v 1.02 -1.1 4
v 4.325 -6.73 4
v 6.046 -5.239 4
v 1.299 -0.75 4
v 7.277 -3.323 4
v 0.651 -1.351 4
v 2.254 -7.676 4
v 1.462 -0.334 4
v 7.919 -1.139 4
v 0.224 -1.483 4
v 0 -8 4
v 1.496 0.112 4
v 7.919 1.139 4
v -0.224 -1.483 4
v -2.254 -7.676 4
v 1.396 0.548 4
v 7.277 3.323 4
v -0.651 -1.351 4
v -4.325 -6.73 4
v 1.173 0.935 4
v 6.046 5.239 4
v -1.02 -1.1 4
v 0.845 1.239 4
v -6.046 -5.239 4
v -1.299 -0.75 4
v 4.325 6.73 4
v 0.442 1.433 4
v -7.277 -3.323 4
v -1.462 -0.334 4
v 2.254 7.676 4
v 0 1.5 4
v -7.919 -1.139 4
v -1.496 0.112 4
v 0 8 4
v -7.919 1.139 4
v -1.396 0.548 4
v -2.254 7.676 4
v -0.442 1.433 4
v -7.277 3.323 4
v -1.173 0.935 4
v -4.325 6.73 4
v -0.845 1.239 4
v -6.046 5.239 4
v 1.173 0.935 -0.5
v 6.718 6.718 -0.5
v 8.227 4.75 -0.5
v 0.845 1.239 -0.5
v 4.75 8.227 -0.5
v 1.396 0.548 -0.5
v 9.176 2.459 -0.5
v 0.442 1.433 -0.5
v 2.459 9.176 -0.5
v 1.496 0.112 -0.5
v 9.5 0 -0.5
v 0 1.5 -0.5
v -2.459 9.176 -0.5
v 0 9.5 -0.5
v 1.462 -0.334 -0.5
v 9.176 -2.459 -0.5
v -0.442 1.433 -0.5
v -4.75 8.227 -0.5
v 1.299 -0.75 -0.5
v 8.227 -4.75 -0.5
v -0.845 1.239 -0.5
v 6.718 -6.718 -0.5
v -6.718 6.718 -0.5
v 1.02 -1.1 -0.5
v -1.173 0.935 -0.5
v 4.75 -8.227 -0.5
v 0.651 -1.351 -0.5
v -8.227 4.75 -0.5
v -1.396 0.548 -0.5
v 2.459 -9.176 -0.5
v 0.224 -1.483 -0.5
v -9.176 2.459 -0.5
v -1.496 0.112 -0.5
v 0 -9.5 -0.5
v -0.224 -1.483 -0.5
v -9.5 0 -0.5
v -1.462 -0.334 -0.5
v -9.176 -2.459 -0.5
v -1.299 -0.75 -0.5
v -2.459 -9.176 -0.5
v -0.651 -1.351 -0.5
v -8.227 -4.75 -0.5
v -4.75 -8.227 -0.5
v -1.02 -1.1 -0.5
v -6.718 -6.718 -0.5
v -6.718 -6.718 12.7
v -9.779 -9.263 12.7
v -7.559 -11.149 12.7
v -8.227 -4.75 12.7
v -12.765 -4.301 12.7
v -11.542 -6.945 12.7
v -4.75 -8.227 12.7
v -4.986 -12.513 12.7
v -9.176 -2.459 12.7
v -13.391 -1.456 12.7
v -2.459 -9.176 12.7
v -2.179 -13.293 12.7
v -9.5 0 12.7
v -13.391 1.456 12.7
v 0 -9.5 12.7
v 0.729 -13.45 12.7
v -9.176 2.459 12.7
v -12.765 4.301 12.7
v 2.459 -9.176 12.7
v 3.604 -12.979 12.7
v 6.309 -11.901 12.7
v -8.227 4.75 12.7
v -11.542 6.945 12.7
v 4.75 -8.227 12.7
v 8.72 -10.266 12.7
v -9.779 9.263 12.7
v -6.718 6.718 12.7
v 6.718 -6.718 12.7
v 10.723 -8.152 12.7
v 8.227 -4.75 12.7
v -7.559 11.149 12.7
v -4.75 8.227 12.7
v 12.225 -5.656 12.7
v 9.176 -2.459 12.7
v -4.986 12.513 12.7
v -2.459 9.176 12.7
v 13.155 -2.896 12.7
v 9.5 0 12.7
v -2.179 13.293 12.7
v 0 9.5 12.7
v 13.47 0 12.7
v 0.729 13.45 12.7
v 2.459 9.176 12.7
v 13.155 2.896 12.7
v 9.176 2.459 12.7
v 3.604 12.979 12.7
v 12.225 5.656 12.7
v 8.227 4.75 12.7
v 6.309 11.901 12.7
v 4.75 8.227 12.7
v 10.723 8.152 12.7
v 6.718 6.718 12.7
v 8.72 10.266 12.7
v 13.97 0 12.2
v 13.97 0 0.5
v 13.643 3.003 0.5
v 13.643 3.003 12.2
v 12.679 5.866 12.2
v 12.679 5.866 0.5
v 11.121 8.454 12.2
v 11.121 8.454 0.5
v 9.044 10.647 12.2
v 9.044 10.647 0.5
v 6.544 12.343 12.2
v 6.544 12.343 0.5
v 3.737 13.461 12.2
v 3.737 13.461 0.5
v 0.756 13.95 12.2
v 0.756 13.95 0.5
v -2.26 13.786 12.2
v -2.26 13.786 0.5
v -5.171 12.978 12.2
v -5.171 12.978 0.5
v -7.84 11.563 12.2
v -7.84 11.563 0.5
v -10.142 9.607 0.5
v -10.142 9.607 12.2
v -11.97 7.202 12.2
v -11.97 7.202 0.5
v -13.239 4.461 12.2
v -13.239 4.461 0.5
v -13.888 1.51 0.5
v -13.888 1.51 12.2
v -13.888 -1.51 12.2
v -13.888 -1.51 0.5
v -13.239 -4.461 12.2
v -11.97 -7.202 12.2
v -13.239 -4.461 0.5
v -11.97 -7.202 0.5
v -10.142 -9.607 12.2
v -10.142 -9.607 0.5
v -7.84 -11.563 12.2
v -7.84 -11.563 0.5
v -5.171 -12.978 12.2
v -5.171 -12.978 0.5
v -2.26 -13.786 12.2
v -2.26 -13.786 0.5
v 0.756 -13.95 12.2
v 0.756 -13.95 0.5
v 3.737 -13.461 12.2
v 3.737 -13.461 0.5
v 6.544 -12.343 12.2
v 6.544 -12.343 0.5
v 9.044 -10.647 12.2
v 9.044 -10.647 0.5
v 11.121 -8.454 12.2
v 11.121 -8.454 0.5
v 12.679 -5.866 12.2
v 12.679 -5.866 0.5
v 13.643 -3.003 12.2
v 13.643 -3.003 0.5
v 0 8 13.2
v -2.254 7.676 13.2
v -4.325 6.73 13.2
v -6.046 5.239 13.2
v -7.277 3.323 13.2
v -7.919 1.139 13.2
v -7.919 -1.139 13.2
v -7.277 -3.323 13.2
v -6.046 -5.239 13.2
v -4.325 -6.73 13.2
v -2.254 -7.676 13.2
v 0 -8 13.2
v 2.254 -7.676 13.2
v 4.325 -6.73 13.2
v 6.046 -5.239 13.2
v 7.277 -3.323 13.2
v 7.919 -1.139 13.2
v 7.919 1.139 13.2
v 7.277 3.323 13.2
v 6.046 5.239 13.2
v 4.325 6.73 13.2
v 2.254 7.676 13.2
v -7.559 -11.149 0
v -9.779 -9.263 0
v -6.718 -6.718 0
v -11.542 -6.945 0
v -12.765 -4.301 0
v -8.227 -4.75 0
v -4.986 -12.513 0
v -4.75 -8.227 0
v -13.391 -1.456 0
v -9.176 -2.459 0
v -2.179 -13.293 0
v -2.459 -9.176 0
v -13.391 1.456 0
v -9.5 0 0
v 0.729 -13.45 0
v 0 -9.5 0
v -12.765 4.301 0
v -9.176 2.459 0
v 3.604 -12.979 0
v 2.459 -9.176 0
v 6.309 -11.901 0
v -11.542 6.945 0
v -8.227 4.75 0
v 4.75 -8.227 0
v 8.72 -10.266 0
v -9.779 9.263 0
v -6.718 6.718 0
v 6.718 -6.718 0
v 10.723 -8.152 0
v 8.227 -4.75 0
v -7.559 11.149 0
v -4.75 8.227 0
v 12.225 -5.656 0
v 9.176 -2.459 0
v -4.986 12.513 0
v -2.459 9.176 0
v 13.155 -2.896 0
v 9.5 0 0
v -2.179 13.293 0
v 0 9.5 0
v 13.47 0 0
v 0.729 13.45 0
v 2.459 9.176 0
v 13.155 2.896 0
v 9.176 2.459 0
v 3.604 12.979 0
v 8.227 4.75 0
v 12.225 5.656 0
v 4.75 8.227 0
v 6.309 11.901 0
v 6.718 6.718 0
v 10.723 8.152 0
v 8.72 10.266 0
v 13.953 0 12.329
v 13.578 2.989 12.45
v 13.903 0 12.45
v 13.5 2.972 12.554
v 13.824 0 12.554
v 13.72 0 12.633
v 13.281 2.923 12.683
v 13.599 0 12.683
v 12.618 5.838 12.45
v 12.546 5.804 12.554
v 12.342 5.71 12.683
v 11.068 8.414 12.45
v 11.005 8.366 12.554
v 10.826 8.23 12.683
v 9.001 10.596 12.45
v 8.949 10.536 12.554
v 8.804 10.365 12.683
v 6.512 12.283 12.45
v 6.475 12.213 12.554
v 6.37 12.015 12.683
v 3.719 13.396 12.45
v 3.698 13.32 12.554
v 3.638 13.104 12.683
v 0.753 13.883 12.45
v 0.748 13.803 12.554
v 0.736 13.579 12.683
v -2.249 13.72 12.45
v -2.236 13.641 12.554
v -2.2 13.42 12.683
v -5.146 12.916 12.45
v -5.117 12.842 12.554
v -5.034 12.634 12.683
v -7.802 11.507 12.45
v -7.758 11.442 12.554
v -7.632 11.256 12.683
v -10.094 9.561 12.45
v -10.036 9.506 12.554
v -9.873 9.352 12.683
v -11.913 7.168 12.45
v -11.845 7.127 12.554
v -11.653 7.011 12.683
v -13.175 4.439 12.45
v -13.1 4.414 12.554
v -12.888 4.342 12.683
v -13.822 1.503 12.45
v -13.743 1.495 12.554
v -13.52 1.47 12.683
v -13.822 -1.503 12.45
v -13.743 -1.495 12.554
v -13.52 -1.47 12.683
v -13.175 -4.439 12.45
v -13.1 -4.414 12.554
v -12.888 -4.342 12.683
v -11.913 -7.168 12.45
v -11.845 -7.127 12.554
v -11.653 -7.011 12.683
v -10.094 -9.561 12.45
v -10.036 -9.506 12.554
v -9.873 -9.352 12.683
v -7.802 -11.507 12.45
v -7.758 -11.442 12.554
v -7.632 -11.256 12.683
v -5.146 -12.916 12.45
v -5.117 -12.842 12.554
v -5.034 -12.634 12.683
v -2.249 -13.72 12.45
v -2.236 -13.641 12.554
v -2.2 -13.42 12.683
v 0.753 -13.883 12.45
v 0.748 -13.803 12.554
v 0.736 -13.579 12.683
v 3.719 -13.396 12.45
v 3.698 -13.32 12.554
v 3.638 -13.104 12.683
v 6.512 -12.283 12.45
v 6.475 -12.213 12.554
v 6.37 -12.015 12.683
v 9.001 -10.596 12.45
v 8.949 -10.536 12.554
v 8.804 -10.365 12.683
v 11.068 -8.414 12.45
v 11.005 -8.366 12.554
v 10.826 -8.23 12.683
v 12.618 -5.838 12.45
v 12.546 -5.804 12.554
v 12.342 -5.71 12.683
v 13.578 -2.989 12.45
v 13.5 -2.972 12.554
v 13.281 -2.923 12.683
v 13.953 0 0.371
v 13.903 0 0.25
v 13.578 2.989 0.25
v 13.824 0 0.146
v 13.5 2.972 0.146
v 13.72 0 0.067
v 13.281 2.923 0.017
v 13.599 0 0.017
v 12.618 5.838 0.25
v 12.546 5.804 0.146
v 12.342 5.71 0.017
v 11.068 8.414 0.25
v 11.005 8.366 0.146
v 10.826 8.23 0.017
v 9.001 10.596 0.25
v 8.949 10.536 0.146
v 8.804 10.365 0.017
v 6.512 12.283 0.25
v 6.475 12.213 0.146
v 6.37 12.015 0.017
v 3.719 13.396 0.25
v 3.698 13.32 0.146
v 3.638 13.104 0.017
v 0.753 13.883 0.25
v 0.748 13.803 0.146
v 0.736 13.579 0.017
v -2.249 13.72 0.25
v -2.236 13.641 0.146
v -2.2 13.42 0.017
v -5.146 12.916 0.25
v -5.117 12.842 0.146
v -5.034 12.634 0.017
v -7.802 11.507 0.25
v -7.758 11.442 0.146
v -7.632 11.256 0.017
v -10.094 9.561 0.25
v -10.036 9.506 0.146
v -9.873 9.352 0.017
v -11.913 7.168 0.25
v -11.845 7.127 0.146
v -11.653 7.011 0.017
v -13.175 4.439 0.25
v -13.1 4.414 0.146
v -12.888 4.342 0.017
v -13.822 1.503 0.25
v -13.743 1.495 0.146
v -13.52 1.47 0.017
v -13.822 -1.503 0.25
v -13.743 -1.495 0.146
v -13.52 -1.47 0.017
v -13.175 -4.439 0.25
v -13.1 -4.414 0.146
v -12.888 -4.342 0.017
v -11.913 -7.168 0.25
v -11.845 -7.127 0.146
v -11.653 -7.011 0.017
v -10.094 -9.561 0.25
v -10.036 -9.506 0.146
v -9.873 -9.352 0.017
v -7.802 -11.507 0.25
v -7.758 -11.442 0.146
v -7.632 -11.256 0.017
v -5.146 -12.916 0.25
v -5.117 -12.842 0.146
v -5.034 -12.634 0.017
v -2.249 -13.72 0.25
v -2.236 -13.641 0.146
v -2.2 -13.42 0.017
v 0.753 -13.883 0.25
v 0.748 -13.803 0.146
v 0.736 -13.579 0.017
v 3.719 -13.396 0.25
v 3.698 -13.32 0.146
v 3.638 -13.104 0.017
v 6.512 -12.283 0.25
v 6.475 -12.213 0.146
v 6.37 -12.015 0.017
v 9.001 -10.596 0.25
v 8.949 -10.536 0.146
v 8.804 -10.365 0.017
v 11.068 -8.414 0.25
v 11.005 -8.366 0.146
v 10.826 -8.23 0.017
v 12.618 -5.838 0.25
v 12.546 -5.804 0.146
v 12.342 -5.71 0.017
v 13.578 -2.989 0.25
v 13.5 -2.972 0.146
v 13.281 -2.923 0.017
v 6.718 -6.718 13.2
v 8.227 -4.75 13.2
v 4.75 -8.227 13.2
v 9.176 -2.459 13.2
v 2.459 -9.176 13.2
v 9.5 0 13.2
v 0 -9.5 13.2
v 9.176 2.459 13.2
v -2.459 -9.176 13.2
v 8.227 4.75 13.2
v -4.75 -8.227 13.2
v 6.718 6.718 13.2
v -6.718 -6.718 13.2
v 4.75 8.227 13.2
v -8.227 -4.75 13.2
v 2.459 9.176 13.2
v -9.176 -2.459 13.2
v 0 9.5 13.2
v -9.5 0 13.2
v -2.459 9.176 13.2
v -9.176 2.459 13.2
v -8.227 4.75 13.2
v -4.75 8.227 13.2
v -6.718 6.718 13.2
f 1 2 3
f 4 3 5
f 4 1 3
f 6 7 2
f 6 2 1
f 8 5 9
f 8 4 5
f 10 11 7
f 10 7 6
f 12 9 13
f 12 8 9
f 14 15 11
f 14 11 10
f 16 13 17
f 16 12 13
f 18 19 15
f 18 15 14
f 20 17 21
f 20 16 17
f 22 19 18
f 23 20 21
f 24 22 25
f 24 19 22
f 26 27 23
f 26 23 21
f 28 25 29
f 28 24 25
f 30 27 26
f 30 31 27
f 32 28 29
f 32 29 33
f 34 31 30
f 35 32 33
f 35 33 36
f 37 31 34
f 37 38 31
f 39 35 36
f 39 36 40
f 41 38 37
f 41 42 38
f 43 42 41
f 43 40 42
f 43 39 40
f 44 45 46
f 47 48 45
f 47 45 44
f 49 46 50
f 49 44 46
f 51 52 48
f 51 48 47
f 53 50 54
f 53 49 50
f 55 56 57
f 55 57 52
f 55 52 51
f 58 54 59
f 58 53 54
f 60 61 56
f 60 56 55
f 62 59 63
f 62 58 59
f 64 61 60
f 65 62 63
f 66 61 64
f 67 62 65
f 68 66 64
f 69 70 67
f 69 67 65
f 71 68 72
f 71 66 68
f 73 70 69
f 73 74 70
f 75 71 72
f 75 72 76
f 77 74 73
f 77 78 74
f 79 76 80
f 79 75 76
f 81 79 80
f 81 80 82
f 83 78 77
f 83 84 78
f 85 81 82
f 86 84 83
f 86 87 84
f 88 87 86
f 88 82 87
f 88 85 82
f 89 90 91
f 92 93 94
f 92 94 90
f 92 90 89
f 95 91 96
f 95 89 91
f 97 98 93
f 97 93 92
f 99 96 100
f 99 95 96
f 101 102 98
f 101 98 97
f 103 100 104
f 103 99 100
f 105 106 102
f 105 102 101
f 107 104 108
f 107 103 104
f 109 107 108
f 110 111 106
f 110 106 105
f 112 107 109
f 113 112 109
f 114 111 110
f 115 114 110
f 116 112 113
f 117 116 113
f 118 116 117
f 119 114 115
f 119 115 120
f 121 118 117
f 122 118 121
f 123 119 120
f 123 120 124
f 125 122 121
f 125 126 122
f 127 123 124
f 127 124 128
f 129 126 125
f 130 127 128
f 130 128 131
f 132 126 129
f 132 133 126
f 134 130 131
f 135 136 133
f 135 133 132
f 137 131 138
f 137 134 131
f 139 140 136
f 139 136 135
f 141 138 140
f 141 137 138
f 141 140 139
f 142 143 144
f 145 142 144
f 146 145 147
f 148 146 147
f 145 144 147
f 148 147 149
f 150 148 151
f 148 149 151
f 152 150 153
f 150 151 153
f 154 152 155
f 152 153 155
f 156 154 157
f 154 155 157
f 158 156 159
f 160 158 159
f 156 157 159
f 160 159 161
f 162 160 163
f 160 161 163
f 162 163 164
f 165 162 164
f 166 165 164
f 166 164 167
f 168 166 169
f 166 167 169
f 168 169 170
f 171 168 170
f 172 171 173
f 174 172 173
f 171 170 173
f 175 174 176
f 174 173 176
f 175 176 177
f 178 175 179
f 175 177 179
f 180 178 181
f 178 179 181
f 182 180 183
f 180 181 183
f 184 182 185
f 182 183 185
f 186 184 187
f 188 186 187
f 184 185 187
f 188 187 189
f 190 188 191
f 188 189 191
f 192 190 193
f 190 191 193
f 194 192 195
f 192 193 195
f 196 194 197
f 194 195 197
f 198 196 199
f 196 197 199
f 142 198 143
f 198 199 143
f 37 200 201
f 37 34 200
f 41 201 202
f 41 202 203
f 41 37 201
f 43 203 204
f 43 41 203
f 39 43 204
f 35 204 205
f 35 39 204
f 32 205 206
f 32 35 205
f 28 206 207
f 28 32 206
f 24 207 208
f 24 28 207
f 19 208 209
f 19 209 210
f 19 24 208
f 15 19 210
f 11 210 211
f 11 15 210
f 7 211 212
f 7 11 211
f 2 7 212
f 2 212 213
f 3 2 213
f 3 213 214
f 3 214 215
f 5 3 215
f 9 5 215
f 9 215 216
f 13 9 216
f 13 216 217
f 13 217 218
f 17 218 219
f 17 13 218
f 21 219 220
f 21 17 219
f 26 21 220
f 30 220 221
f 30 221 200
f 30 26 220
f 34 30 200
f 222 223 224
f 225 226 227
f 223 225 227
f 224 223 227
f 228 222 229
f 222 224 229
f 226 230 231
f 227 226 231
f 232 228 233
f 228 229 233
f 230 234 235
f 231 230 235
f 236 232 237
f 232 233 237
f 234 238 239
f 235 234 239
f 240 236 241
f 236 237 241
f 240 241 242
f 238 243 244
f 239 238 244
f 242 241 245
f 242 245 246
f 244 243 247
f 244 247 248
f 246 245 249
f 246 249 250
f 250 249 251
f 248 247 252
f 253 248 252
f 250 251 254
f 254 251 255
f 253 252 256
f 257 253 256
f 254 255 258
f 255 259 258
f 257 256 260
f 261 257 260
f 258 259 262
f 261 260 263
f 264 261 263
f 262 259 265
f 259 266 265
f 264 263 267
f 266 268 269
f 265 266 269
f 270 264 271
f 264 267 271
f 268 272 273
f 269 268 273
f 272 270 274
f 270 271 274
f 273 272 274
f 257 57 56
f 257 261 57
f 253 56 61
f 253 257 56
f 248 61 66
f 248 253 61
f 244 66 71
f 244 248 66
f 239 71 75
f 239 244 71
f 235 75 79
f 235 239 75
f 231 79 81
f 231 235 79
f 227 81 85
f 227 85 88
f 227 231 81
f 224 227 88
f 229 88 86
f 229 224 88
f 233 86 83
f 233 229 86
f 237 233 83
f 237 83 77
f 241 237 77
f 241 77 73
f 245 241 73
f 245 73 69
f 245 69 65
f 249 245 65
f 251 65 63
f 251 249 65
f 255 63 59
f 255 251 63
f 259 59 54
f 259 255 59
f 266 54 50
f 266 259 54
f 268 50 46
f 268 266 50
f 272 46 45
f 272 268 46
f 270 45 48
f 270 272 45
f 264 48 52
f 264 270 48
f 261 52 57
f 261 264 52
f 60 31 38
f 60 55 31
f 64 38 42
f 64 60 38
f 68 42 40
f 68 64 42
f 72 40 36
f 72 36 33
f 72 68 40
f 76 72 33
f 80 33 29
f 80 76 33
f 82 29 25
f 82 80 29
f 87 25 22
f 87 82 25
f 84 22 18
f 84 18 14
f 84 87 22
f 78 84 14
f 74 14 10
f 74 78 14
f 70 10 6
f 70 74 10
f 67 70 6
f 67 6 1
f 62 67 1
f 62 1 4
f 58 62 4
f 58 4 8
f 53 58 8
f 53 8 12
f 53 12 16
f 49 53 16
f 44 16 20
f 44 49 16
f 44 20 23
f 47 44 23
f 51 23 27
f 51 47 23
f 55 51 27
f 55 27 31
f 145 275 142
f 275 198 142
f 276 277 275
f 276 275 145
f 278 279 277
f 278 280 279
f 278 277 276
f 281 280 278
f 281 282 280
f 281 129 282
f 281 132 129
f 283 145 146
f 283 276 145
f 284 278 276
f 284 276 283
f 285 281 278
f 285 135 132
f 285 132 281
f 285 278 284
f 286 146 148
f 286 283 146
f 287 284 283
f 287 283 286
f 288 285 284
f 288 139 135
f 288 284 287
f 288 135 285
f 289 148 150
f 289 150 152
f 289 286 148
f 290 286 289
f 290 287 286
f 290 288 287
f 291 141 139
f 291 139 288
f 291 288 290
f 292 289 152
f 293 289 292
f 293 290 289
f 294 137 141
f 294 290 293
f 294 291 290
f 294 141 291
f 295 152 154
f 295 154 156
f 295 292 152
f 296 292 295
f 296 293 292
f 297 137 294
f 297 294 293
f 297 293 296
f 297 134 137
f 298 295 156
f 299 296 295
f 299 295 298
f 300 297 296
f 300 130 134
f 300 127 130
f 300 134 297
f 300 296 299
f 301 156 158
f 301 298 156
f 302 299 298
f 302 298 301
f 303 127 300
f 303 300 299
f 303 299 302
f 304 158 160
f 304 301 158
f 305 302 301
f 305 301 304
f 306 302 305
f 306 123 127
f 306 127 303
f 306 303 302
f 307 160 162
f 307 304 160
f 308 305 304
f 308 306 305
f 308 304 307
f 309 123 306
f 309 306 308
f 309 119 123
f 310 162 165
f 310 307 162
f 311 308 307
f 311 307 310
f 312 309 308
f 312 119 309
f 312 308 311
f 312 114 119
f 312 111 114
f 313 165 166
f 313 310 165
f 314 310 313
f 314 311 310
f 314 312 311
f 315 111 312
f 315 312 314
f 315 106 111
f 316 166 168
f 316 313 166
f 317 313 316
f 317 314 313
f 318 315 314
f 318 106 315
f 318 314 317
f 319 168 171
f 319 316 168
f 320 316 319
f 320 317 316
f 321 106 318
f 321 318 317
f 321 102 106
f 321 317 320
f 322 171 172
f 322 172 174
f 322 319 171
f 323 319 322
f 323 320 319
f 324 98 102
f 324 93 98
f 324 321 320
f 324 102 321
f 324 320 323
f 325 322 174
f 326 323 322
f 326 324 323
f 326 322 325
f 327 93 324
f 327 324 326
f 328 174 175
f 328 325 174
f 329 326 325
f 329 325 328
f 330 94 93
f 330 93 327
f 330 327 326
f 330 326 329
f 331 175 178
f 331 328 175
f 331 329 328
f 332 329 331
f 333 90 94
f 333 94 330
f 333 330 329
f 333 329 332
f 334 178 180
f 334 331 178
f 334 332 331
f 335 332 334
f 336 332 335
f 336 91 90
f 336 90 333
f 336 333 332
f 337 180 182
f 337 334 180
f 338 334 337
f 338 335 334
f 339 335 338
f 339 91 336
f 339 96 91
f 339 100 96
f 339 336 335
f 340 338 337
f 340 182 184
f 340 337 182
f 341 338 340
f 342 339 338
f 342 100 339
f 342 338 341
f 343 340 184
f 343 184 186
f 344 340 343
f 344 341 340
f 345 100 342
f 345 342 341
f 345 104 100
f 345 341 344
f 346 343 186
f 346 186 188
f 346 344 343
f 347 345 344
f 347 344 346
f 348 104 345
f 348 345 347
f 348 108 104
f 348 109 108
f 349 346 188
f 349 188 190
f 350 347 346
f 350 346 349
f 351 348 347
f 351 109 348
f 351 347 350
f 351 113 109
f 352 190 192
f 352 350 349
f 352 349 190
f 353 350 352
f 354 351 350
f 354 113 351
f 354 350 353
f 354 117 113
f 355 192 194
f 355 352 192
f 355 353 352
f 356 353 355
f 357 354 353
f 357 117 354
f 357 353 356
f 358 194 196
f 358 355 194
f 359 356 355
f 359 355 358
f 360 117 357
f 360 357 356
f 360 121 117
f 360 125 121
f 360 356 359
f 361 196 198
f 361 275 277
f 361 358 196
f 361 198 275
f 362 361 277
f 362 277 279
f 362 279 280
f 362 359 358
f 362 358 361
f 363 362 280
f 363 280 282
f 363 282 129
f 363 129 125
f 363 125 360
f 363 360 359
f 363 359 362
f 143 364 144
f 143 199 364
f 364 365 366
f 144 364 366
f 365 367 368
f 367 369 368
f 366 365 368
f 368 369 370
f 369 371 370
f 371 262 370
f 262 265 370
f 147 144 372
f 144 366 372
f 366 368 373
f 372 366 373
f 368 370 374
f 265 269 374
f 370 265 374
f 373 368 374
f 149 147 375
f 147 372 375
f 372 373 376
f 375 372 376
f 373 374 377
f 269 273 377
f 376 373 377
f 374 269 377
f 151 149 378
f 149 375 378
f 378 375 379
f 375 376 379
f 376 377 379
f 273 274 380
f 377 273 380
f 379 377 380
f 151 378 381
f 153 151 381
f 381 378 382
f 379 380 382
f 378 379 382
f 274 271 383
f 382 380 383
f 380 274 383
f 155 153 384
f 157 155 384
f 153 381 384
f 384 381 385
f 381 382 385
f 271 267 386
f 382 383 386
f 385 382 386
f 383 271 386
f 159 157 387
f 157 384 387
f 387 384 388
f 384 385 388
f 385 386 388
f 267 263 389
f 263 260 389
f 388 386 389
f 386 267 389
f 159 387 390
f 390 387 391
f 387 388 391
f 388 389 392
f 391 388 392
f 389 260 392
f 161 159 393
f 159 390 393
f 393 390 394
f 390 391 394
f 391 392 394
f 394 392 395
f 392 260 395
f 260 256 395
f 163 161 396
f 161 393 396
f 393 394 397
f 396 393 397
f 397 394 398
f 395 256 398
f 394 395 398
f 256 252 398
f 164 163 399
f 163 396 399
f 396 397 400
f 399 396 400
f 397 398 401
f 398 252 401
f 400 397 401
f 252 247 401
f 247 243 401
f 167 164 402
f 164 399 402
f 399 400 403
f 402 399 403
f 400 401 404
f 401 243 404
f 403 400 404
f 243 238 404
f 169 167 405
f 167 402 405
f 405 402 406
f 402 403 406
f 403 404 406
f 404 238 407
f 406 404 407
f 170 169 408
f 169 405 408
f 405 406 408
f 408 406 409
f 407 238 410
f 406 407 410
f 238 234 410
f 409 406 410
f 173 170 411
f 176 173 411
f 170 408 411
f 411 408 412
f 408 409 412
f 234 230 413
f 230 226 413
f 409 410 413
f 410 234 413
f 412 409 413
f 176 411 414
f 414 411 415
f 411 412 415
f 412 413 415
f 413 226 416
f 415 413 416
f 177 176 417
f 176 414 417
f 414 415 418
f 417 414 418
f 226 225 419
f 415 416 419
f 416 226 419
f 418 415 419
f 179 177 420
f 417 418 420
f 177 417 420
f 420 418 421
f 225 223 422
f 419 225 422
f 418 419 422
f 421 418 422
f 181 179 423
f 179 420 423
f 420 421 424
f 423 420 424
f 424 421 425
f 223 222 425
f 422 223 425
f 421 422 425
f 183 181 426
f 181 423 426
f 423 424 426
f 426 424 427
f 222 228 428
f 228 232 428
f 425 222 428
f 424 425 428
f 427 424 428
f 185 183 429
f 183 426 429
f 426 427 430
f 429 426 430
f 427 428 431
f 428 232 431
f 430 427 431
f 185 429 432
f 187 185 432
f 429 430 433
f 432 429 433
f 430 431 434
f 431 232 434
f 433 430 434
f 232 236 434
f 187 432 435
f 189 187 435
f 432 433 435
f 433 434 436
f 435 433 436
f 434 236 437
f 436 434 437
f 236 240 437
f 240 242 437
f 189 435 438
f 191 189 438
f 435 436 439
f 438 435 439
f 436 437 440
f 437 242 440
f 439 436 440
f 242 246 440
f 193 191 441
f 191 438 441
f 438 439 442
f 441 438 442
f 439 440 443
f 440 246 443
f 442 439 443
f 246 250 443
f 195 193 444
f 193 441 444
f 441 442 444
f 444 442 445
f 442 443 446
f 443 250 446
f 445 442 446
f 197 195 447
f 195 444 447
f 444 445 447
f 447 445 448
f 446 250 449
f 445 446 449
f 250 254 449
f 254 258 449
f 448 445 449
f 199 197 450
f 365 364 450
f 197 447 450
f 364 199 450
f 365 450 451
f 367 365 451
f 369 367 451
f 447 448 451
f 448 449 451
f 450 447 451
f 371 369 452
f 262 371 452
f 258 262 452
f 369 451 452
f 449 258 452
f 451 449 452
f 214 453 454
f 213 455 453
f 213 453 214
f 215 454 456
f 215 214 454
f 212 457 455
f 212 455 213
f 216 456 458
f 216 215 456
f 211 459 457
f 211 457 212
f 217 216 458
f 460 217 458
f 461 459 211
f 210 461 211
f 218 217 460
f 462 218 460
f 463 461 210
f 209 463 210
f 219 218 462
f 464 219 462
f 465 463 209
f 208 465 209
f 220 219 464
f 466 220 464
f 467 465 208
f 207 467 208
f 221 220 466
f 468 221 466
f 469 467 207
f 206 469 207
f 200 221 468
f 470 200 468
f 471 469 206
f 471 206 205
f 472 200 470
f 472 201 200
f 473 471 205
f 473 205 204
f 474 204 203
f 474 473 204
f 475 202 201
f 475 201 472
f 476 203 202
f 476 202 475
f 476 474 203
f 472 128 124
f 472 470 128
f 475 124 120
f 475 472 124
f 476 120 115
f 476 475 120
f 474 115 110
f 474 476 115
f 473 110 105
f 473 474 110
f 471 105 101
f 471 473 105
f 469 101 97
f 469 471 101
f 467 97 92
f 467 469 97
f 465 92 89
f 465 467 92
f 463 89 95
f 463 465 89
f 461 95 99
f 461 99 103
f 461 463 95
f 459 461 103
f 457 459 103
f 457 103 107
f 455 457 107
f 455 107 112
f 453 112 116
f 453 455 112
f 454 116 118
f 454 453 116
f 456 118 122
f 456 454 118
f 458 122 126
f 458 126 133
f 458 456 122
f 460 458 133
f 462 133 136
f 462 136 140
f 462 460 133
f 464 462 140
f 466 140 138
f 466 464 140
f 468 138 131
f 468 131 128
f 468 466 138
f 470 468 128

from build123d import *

# Parameters (mm, degrees)
SKETCH1_R           = 13.97
SKETCH1_R_2         = 8.5
BOSS_EXTRUDE1_DEPTH = 12.7
FILLET1_R           = 0.5


with BuildPart() as part:
    # Sketch1 → Boss-Extrude1 (new body)
    with BuildSketch(Plane.XY):
        Circle(SKETCH1_R)
        Circle(SKETCH1_R_2, mode=Mode.SUBTRACT)
    extrude(amount=BOSS_EXTRUDE1_DEPTH)

    # Fillet1
    fillet1_edges = [part.edges().sort_by_distance(p)[0] for p in [
        (-13.97, 0, 0),
        (-13.97, 0, 12.7),
    ]]
    fillet(fillet1_edges, radius=FILLET1_R)

    # Sketch2 → Revolve1 (revolve)
    with BuildSketch(Plane(origin=(0, 0, 0), x_dir=(0, 0, -1), z_dir=(1, 0, 0))):
        Polygon((0, 8.5), (-12.7, 8.5), (-12.7, 9.5), (-13.2, 9.5), (-13.2, 8), (-4, 8), (-4, 1.5), (0.5, 1.5), (0.5, 9.5), (0, 9.5), align=None)
    revolve(axis=Axis((0, 0, 0), (0, 0, 1)))


solid = part.part
